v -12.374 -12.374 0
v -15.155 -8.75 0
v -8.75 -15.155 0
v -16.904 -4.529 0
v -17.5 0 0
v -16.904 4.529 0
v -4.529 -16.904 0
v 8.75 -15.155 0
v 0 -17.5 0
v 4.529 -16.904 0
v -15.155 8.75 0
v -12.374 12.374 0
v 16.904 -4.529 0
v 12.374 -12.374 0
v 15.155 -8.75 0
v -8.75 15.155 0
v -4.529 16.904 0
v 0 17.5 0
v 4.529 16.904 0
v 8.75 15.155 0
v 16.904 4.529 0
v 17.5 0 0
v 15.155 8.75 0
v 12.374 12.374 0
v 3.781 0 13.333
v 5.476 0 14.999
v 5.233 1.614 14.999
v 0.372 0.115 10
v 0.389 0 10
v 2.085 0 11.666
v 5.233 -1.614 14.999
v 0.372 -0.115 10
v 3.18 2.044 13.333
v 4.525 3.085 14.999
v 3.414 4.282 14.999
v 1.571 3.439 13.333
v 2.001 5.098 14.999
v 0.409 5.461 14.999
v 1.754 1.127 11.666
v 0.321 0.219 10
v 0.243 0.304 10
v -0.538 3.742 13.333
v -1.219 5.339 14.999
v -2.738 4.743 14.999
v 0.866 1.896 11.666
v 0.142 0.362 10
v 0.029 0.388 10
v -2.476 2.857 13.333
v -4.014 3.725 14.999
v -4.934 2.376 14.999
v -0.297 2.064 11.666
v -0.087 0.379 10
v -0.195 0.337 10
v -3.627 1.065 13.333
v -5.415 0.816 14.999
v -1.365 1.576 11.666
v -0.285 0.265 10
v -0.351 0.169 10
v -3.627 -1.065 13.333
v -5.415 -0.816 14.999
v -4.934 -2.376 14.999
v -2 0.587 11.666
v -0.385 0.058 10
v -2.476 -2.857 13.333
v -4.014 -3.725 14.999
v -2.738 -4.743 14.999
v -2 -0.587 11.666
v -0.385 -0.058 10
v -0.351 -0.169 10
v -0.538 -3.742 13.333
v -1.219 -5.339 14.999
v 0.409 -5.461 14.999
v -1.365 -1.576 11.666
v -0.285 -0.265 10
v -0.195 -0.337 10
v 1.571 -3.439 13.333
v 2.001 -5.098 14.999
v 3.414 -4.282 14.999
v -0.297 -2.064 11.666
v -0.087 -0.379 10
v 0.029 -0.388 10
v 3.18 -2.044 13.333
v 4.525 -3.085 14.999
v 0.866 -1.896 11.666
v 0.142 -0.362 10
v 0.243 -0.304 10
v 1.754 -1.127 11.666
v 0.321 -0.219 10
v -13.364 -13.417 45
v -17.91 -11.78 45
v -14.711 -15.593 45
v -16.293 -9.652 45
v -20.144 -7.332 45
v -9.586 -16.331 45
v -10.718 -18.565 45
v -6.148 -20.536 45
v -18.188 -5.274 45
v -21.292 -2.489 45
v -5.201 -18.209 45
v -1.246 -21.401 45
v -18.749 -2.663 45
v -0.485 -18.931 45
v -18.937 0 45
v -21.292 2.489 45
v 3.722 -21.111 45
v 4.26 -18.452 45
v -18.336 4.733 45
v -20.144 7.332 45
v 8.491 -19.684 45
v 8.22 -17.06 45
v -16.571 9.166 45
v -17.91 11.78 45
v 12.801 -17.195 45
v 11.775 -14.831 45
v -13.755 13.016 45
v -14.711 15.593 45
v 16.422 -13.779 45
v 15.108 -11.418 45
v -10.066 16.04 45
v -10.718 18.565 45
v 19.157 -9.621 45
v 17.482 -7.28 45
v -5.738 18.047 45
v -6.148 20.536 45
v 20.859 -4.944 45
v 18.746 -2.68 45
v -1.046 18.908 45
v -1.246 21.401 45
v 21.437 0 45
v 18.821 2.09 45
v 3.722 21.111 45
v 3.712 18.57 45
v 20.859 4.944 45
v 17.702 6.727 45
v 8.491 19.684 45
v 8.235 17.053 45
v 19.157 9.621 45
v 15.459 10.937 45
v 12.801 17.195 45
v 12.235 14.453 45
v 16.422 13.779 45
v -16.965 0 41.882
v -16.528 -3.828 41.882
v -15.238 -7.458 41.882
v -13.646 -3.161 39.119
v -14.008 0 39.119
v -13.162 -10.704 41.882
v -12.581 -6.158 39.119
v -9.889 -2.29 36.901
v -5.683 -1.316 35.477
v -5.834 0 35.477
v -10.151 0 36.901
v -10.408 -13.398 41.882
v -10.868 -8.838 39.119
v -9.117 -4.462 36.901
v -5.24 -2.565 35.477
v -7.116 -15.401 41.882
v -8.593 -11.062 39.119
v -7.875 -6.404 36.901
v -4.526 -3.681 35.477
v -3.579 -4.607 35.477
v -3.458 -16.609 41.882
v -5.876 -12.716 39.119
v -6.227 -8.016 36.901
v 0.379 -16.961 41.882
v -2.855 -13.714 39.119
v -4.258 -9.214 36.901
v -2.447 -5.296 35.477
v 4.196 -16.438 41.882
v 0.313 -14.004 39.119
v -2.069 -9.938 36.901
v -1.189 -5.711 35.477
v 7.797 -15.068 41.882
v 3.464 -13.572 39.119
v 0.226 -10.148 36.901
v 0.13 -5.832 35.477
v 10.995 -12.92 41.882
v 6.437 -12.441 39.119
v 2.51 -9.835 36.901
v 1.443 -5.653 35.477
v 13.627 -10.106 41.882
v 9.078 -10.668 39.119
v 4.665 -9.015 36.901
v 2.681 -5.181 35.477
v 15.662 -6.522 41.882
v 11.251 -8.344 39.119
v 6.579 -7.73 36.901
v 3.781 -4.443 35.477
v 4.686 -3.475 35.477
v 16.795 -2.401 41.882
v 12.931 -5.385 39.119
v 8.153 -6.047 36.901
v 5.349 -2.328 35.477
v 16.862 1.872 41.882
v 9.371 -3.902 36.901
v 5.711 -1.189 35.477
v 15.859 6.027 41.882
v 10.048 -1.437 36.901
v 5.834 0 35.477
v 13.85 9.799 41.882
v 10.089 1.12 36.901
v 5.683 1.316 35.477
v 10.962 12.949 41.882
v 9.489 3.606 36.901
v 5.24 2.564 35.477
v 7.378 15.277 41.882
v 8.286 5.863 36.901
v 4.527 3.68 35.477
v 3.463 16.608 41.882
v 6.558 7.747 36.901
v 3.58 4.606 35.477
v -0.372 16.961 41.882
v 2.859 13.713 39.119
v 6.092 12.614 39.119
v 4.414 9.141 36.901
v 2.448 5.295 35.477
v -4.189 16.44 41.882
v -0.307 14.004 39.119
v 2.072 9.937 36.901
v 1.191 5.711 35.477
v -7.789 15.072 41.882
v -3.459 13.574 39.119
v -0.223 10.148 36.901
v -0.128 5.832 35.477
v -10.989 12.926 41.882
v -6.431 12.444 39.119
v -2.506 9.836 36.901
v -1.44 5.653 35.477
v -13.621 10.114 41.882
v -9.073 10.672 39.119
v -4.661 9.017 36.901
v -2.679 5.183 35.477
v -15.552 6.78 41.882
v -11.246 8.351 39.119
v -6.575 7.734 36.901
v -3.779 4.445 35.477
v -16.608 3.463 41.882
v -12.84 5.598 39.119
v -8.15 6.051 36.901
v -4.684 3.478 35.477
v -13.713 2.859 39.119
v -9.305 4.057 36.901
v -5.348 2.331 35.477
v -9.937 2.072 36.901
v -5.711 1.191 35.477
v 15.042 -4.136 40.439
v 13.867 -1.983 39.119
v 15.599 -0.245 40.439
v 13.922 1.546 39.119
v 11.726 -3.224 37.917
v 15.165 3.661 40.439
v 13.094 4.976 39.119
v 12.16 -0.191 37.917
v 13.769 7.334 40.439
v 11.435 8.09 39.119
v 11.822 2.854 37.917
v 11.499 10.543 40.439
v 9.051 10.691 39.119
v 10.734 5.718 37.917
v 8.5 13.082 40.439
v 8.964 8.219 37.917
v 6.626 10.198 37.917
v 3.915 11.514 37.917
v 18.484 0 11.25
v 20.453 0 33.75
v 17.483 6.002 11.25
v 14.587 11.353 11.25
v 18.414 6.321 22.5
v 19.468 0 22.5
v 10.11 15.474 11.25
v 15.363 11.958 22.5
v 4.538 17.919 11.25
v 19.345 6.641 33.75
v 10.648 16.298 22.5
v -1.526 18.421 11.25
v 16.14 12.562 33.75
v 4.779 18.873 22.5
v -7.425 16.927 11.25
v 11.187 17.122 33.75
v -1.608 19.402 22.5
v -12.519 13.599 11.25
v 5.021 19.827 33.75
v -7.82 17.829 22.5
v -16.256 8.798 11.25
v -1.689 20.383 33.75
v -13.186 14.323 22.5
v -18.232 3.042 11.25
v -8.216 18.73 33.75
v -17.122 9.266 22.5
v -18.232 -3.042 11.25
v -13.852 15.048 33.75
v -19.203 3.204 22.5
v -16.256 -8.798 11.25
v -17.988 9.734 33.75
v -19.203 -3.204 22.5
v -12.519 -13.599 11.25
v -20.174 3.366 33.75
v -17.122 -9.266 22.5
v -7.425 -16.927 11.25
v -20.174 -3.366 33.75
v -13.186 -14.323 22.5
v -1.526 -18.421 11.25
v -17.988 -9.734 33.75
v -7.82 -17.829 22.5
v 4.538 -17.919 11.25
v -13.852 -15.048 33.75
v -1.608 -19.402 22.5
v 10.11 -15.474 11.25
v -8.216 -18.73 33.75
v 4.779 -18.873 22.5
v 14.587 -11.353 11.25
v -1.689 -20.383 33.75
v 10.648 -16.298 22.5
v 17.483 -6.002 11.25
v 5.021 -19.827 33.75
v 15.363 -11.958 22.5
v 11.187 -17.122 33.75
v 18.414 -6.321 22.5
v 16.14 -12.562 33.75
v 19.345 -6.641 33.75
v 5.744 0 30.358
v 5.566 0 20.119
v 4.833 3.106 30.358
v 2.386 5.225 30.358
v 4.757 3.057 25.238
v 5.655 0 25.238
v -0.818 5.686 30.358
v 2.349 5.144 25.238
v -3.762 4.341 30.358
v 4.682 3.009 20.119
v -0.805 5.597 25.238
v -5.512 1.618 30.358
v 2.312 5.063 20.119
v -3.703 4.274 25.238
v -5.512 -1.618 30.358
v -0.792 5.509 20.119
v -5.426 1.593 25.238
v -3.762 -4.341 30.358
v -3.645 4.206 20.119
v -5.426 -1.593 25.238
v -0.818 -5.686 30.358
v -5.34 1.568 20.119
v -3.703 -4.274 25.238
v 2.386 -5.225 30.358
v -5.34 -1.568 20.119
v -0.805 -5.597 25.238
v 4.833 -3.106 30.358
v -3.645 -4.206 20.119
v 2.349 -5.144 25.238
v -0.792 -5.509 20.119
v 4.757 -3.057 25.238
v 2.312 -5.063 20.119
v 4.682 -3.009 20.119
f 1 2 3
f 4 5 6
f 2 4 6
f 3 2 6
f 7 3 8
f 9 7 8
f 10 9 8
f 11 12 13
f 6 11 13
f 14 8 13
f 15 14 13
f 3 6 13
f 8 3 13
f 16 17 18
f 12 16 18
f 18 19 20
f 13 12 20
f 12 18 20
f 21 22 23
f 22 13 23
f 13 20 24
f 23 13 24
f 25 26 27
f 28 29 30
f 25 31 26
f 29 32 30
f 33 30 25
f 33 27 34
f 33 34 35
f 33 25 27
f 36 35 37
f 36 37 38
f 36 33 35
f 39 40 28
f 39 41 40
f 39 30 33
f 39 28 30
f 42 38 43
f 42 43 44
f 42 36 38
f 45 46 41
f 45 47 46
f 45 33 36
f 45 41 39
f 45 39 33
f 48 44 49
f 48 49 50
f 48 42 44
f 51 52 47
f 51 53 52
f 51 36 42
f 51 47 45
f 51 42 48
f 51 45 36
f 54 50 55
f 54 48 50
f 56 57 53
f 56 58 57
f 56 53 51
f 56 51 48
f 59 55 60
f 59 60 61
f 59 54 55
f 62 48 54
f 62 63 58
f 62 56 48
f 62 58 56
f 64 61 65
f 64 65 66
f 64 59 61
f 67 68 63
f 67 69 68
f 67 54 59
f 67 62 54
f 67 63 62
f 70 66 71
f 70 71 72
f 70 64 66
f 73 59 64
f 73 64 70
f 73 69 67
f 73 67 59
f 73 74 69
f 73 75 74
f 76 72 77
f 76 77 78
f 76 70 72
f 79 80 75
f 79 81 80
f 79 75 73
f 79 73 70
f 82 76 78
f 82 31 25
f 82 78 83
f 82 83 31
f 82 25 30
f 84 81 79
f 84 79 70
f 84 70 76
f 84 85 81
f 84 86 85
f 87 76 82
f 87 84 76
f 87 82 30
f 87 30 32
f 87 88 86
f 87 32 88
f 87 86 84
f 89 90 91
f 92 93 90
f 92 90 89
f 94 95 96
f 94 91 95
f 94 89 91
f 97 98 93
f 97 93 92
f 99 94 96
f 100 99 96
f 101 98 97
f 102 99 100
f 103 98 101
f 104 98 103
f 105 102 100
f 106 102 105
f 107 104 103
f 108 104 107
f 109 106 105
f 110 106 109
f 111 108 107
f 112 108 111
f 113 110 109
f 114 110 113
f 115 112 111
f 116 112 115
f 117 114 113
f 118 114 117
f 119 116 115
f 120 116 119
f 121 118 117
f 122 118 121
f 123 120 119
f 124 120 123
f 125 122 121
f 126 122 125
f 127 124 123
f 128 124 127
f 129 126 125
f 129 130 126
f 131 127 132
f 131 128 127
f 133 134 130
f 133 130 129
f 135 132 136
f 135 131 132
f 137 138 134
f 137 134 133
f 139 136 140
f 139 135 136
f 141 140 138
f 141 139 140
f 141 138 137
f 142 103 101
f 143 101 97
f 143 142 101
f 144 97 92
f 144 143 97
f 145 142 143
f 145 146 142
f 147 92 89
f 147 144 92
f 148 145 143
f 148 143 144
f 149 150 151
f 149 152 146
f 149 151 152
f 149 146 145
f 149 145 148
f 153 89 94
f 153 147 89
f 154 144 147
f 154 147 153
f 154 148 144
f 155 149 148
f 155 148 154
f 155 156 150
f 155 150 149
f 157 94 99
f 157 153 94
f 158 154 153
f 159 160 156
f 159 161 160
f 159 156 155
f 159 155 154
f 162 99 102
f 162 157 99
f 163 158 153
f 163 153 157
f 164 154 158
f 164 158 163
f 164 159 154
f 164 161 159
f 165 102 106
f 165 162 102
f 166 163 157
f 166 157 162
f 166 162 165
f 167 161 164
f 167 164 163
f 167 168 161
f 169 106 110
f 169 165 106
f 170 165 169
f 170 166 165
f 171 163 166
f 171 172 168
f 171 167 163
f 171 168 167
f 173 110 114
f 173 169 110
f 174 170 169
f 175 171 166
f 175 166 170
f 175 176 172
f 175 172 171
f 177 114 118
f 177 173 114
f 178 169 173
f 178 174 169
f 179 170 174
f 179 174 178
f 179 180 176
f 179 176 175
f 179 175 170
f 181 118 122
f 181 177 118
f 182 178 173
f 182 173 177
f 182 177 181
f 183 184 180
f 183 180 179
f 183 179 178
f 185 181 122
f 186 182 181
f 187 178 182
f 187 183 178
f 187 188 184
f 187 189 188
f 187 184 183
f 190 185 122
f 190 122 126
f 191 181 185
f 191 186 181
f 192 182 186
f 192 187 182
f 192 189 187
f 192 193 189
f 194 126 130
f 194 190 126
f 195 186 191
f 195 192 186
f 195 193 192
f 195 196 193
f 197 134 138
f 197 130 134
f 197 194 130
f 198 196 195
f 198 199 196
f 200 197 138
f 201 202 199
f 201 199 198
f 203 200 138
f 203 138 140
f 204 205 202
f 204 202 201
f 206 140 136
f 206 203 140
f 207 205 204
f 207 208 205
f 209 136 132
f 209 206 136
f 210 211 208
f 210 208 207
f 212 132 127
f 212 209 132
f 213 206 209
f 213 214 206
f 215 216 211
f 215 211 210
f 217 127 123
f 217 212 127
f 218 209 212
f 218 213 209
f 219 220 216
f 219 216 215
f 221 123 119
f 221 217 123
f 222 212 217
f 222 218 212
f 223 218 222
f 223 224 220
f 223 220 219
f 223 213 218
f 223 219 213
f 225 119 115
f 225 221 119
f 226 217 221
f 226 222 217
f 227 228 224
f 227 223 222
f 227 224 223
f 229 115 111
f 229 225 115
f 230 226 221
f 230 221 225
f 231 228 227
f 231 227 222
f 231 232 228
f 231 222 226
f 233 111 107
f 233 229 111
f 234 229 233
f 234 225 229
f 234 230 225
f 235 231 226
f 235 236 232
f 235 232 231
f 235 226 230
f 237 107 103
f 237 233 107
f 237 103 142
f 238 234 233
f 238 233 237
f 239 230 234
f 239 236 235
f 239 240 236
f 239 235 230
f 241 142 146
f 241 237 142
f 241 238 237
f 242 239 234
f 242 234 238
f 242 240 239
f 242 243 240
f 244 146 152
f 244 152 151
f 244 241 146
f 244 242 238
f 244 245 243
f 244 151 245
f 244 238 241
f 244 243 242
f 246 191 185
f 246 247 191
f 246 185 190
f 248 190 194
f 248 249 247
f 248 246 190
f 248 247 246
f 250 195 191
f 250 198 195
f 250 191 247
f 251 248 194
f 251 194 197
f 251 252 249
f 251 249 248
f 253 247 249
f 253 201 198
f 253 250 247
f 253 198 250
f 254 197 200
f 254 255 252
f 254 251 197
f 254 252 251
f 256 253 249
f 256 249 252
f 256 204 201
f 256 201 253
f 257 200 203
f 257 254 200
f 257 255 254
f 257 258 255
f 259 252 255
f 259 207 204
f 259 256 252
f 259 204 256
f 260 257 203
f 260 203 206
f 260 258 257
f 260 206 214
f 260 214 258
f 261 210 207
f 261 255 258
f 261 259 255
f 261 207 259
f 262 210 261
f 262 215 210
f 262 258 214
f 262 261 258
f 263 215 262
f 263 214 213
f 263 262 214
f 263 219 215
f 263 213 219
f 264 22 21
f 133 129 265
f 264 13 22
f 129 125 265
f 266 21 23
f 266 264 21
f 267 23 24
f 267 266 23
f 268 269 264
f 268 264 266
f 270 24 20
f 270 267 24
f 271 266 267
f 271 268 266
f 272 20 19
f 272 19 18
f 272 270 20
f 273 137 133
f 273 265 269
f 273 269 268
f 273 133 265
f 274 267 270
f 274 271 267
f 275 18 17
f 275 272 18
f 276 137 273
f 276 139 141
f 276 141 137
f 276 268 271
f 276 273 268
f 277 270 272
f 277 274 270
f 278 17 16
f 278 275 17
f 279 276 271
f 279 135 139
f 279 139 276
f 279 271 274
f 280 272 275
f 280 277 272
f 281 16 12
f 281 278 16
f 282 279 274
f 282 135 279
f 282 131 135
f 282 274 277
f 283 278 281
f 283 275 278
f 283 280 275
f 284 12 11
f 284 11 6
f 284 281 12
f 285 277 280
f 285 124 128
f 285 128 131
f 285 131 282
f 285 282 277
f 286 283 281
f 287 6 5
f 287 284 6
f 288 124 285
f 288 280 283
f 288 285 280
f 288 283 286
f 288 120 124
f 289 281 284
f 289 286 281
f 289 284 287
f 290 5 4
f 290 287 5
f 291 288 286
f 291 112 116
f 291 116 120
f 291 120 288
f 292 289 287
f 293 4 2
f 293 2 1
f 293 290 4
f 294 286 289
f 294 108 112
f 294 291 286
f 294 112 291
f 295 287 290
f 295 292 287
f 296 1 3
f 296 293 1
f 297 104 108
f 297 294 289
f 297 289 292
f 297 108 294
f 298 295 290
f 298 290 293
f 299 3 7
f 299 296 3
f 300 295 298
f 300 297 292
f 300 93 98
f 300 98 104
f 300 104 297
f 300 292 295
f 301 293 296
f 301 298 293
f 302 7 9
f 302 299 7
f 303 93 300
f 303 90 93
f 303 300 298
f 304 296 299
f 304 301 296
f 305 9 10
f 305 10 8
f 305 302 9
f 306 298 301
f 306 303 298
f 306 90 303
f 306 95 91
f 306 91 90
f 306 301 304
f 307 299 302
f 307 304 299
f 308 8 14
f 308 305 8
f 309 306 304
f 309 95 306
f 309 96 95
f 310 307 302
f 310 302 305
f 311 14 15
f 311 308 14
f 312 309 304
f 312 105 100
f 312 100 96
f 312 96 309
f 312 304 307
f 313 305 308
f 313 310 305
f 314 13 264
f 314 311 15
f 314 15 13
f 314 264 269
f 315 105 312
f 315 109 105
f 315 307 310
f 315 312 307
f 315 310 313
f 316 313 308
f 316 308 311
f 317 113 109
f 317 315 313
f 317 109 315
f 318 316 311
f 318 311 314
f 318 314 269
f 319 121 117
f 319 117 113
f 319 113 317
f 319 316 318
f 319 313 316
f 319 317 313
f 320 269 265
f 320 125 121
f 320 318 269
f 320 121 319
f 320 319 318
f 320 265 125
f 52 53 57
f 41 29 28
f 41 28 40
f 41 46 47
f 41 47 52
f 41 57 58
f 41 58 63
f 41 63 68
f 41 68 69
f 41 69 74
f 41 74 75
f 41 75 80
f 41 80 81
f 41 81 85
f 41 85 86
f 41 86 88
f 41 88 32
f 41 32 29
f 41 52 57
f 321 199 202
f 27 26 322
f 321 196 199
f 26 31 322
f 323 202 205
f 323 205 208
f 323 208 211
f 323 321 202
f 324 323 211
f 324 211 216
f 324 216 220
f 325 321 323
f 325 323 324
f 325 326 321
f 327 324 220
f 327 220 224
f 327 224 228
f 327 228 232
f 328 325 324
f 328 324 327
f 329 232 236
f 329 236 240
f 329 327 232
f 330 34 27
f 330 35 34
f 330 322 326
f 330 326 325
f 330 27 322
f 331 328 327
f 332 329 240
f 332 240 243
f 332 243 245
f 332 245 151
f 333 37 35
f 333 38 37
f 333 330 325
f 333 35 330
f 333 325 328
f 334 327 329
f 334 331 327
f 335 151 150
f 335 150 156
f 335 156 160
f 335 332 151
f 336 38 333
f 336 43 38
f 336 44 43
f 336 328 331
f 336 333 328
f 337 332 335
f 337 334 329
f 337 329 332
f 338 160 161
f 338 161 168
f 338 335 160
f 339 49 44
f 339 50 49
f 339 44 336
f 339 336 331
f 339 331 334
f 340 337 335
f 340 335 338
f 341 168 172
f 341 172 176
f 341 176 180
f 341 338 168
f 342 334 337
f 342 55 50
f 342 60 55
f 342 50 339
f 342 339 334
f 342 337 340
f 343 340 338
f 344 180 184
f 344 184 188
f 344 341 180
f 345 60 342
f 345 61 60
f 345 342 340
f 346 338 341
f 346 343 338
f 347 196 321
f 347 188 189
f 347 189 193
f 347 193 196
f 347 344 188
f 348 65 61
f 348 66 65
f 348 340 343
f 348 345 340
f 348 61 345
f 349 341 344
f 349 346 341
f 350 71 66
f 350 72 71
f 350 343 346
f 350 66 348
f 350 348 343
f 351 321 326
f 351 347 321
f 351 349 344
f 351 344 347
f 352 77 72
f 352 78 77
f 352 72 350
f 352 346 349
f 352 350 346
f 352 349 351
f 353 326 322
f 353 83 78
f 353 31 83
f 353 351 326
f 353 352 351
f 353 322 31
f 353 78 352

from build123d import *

# Parameters (mm, degrees)
F0_R     = 17.5
F1_DEPTH = 45
F1_TAPER = -5
F3_R     = 6
F4_DEPTH = 35
F4_TAPER = 1
F5_SIZE  = 5


with BuildPart() as f1:
    # F0 (on Top) → F1 (new body)
    with BuildSketch(Plane.XY):
        Circle(F0_R)
    extrude(amount=F1_DEPTH, taper=F1_TAPER)

    # F3 (on face) → F4 (cut)
    with BuildSketch(Plane.XY.offset(45)):
        Circle(F3_R)
    extrude(amount=-F4_DEPTH, taper=F4_TAPER, mode=Mode.SUBTRACT)

    # F5
    f5_edges = [f1.edges().sort_by_distance(p)[0] for p in [
        (-5.389073, 0, 10),
    ]]
    chamfer(f5_edges, length=F5_SIZE)

    # F2 (on Front) → F6 (revolve, cut)
    with BuildSketch(Plane.XZ):
        with BuildLine():
            Line((0, 34.8251537271), (0, 64.8251537271))
            add(Edge.make_bspline(
                [(0, 64.8251537271), (-20, 64.8251537271), (-20, 49.8251537271), (-20, 34.8251537271), (0, 34.8251537271)],
                knots=[1.5707963268, 1.5707963268, 1.5707963268, 3.1415926536, 3.1415926536, 4.7123889804, 4.7123889804, 4.7123889804], degree=2, weights=[1, 0.7071067812, 1, 0.7071067812, 1]))
        make_face()
    revolve(axis=Axis((0, 0, 39.5477935672), (0, 0, 1)), mode=Mode.SUBTRACT)


solid = f1.part
